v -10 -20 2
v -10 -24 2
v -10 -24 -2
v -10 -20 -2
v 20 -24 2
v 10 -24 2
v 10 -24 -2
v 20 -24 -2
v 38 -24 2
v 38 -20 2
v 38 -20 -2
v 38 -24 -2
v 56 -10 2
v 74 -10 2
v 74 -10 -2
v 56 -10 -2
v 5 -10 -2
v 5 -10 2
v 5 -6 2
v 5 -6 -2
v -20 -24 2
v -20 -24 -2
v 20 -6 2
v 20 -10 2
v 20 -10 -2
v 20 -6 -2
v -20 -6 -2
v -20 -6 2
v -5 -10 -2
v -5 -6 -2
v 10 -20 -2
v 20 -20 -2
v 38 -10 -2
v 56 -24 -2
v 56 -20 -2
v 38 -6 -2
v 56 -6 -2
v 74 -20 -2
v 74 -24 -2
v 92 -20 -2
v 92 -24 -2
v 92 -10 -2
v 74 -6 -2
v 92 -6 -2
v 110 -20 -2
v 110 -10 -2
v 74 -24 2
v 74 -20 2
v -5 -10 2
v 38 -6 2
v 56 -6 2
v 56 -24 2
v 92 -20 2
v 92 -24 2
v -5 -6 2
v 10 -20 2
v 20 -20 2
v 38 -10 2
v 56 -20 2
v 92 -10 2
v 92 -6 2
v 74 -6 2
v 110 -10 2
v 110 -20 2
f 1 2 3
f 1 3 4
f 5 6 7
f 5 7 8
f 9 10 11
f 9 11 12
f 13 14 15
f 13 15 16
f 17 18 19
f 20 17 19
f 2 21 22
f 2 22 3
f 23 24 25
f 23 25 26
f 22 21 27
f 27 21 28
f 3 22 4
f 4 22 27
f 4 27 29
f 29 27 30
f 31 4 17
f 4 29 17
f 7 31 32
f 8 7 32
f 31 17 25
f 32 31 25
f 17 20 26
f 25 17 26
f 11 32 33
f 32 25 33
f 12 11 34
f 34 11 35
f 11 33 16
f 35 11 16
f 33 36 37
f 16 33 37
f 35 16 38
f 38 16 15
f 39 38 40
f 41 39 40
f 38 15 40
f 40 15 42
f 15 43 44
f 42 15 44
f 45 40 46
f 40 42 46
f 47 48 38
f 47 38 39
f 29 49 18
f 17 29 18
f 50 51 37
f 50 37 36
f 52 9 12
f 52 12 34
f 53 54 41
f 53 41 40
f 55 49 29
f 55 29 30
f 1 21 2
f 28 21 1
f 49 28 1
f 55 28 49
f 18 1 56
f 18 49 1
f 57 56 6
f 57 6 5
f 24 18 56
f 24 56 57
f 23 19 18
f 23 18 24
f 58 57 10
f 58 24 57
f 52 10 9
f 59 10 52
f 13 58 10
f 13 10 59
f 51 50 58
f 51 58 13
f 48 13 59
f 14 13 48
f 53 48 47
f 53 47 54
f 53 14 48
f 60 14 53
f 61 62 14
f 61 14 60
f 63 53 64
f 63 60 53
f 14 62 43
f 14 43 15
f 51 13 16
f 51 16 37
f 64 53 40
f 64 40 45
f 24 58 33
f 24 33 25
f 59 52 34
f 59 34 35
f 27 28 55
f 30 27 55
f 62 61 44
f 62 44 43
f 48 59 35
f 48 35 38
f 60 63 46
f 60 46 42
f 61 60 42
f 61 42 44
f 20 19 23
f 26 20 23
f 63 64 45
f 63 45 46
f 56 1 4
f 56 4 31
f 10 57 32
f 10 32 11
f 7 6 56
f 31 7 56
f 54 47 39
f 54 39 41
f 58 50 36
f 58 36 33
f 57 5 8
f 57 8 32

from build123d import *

# Parameters (mm, degrees)
SKETCH1_W           = 40
SKETCH1_H           = 40
BOSS_EXTRUDE1_DEPTH = 2
SKETCH2_R           = 1.5
CUT_EXTRUDE1_DEPTH  = 29.565713714
SKETCH3_W           = 4
SKETCH3_H           = 10
SKETCH3_W_2         = 10
SKETCH3_H_2         = 4
CUT_EXTRUDE2_DEPTH  = 29.565713714
SKETCH4_W           = 10
SKETCH4_H           = 4
BOSS_EXTRUDE2_DEPTH = 4
BOSS_EXTRUDE3_DEPTH = 4
SKETCH6_W           = 40
SKETCH6_H           = 26
CUT_EXTRUDE3_DEPTH  = 113.658776844
SKETCH7_W           = 4
SKETCH7_H           = 9
BOSS_EXTRUDE4_DEPTH = 4


with BuildPart() as part:
    # Sketch1 → Boss-Extrude1 (new, symmetric)
    with BuildSketch(Plane.XY):
        Rectangle(SKETCH1_W, SKETCH1_H)
    extrude(amount=BOSS_EXTRUDE1_DEPTH, both=True)

    # Sketch2 → Cut-Extrude1 (cut, through all)
    with BuildSketch(Plane.XY.offset(2)):
        with Locations((12, 14.35)):
            Circle(SKETCH2_R)
        with Locations((12, -3.15)):
            Circle(SKETCH2_R)
    extrude(amount=-CUT_EXTRUDE1_DEPTH, mode=Mode.SUBTRACT)

    # Sketch3 → Cut-Extrude2 (cut, through all)
    with BuildSketch(Plane.XY.offset(2)):
        with Locations((18, 10)):
            Rectangle(SKETCH3_W, SKETCH3_H)
        with Locations((-18, 10)):
            Rectangle(SKETCH3_W, SKETCH3_H)
        with Locations((-18, -10)):
            Rectangle(SKETCH3_W, SKETCH3_H)
        with Locations((18, -10)):
            Rectangle(SKETCH3_W, SKETCH3_H)
        with Locations((0, -8)):
            Rectangle(SKETCH3_W_2, SKETCH3_H_2)
    extrude(amount=-CUT_EXTRUDE2_DEPTH, mode=Mode.SUBTRACT)

    # Sketch4 → Boss-Extrude2 (add)
    with BuildSketch(Plane.XY.offset(2)):
        with Locations((-15, -22)):
            Rectangle(SKETCH4_W, SKETCH4_H)
        with Locations((15, -22)):
            Rectangle(SKETCH4_W, SKETCH4_H)
    extrude(amount=-BOSS_EXTRUDE2_DEPTH)

    # Sketch5 → Boss-Extrude3 (add)
    with BuildSketch(Plane.XY.offset(2)):
        Polygon((20, -20), (38, -20), (38, -24), (56, -24), (56, -20), (74, -20), (74, -24), (92, -24), (92, -20), (110, -20), (110, -10), (92, -10), (92, -6), (74, -6), (74, -10), (56, -10), (56, -6), (38, -6), (38, -10), (20, -10), align=None)
    extrude(amount=-BOSS_EXTRUDE3_DEPTH)

    # Sketch6 → Cut-Extrude3 (cut, through all)
    with BuildSketch(Plane.XY.offset(2)):
        with Locations((0, 7)):
            Rectangle(SKETCH6_W, SKETCH6_H)
    extrude(amount=-CUT_EXTRUDE3_DEPTH, mode=Mode.SUBTRACT)

    # Sketch7 → Boss-Extrude4 (add)
    with BuildSketch(Plane.XY.offset(2)):
        with Locations((18, -10.5)):
            Rectangle(SKETCH7_W, SKETCH7_H)
        with Locations((-18, -10.5)):
            Rectangle(SKETCH7_W, SKETCH7_H)
    extrude(amount=-BOSS_EXTRUDE4_DEPTH)


solid = part.part
